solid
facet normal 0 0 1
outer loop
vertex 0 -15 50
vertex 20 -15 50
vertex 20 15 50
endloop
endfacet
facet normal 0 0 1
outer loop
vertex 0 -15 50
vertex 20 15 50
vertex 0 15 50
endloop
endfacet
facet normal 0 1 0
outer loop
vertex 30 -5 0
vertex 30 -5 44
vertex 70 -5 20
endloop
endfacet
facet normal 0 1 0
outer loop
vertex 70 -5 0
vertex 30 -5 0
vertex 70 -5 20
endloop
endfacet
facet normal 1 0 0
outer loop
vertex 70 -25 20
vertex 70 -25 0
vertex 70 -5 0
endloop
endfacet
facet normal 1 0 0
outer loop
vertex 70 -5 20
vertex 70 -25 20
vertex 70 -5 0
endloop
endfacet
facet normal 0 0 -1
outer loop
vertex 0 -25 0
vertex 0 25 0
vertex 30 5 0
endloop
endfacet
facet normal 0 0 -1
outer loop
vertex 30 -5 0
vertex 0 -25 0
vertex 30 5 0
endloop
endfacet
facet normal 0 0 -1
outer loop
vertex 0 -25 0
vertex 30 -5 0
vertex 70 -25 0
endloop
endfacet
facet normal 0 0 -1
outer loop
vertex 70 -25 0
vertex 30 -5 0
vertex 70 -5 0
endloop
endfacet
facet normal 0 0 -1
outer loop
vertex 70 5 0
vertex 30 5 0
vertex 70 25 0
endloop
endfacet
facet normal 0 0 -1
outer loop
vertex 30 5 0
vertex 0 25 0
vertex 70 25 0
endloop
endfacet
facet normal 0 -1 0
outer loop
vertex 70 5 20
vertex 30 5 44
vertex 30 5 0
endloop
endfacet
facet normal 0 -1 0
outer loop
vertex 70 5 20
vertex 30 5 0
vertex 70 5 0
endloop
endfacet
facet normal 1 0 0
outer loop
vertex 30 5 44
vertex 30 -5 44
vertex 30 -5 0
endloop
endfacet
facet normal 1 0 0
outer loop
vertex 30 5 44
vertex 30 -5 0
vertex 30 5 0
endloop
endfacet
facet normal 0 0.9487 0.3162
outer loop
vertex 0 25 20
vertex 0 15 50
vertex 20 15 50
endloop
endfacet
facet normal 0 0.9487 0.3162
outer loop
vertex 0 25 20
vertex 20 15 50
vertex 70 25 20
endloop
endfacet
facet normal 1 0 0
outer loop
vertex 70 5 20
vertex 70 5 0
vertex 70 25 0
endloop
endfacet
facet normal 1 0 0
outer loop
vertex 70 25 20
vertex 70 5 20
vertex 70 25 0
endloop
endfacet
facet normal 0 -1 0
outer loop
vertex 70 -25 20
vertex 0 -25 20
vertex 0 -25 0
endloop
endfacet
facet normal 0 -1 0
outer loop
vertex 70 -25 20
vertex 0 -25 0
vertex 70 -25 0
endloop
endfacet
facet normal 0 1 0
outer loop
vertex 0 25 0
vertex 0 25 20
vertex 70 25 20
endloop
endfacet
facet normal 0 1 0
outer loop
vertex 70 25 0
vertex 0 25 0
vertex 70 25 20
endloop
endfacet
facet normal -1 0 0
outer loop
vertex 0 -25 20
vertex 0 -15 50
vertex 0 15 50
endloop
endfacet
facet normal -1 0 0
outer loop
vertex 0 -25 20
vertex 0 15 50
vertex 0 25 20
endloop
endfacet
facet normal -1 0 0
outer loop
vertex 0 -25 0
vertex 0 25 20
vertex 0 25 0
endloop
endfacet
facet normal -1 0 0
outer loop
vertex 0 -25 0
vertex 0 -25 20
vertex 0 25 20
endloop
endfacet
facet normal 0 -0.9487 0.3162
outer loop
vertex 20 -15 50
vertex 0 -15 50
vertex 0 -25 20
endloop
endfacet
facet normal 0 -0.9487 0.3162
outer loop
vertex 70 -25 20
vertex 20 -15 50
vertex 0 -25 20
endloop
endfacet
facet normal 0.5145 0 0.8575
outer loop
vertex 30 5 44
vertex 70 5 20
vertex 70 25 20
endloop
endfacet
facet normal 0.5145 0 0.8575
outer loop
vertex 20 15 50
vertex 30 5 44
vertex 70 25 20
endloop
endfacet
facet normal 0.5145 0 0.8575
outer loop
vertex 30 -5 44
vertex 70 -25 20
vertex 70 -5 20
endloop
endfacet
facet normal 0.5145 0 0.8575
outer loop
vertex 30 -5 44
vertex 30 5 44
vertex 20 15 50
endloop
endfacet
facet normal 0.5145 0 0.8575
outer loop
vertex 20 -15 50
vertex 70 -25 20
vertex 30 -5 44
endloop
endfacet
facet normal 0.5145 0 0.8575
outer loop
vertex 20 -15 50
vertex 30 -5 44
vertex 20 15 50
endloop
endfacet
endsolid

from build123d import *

# Parameters (mm, degrees)
F0_W     = 70
F0_H     = 50
F1_DEPTH = 20
F3_DEPTH = 50
F5_DEPTH = 70.001
F6_W     = 40
F6_H     = 10
F7_DEPTH = 50.001


# Not quite as in the source:
# - a pattern or mirror of a feature is missing from the dataset's text; its kind, count and spacing are read off the source's solid


with BuildPart() as f1:
    # F0 (on Top) → F1 (new body)
    with BuildSketch(Plane.XY):
        with Locations((35, 0)):
            Rectangle(F0_W, F0_H)
    extrude(amount=F1_DEPTH)

    # F2 (on face) → F3 (join, through all)
    with BuildSketch(Plane.XZ.offset(25)):
        Polygon((0, 50), (0, 20), (70, 20), (20, 50), align=None)
    extrude(amount=-F3_DEPTH)

    # F4 (on face) → F5 (cut, through all)
    with BuildSketch(Plane(origin=(0, 0, 0), x_dir=(0, -1, 0), z_dir=(-1, 0, 0))):
        Polygon((25, 20), (25, 50), (15, 50), align=None)
    f5 = extrude(amount=-F5_DEPTH, mode=Mode.SUBTRACT)

    # F5_copies: F5 across plane
    add(f5.mirror(Plane.ZX), mode=Mode.SUBTRACT)

    # F6 (on face) → F7 (cut, through all)
    with BuildSketch(Plane.XY.offset(50)):
        with Locations((50, 0)):
            Rectangle(F6_W, F6_H)
    extrude(amount=-F7_DEPTH, mode=Mode.SUBTRACT)


solid = f1.part
